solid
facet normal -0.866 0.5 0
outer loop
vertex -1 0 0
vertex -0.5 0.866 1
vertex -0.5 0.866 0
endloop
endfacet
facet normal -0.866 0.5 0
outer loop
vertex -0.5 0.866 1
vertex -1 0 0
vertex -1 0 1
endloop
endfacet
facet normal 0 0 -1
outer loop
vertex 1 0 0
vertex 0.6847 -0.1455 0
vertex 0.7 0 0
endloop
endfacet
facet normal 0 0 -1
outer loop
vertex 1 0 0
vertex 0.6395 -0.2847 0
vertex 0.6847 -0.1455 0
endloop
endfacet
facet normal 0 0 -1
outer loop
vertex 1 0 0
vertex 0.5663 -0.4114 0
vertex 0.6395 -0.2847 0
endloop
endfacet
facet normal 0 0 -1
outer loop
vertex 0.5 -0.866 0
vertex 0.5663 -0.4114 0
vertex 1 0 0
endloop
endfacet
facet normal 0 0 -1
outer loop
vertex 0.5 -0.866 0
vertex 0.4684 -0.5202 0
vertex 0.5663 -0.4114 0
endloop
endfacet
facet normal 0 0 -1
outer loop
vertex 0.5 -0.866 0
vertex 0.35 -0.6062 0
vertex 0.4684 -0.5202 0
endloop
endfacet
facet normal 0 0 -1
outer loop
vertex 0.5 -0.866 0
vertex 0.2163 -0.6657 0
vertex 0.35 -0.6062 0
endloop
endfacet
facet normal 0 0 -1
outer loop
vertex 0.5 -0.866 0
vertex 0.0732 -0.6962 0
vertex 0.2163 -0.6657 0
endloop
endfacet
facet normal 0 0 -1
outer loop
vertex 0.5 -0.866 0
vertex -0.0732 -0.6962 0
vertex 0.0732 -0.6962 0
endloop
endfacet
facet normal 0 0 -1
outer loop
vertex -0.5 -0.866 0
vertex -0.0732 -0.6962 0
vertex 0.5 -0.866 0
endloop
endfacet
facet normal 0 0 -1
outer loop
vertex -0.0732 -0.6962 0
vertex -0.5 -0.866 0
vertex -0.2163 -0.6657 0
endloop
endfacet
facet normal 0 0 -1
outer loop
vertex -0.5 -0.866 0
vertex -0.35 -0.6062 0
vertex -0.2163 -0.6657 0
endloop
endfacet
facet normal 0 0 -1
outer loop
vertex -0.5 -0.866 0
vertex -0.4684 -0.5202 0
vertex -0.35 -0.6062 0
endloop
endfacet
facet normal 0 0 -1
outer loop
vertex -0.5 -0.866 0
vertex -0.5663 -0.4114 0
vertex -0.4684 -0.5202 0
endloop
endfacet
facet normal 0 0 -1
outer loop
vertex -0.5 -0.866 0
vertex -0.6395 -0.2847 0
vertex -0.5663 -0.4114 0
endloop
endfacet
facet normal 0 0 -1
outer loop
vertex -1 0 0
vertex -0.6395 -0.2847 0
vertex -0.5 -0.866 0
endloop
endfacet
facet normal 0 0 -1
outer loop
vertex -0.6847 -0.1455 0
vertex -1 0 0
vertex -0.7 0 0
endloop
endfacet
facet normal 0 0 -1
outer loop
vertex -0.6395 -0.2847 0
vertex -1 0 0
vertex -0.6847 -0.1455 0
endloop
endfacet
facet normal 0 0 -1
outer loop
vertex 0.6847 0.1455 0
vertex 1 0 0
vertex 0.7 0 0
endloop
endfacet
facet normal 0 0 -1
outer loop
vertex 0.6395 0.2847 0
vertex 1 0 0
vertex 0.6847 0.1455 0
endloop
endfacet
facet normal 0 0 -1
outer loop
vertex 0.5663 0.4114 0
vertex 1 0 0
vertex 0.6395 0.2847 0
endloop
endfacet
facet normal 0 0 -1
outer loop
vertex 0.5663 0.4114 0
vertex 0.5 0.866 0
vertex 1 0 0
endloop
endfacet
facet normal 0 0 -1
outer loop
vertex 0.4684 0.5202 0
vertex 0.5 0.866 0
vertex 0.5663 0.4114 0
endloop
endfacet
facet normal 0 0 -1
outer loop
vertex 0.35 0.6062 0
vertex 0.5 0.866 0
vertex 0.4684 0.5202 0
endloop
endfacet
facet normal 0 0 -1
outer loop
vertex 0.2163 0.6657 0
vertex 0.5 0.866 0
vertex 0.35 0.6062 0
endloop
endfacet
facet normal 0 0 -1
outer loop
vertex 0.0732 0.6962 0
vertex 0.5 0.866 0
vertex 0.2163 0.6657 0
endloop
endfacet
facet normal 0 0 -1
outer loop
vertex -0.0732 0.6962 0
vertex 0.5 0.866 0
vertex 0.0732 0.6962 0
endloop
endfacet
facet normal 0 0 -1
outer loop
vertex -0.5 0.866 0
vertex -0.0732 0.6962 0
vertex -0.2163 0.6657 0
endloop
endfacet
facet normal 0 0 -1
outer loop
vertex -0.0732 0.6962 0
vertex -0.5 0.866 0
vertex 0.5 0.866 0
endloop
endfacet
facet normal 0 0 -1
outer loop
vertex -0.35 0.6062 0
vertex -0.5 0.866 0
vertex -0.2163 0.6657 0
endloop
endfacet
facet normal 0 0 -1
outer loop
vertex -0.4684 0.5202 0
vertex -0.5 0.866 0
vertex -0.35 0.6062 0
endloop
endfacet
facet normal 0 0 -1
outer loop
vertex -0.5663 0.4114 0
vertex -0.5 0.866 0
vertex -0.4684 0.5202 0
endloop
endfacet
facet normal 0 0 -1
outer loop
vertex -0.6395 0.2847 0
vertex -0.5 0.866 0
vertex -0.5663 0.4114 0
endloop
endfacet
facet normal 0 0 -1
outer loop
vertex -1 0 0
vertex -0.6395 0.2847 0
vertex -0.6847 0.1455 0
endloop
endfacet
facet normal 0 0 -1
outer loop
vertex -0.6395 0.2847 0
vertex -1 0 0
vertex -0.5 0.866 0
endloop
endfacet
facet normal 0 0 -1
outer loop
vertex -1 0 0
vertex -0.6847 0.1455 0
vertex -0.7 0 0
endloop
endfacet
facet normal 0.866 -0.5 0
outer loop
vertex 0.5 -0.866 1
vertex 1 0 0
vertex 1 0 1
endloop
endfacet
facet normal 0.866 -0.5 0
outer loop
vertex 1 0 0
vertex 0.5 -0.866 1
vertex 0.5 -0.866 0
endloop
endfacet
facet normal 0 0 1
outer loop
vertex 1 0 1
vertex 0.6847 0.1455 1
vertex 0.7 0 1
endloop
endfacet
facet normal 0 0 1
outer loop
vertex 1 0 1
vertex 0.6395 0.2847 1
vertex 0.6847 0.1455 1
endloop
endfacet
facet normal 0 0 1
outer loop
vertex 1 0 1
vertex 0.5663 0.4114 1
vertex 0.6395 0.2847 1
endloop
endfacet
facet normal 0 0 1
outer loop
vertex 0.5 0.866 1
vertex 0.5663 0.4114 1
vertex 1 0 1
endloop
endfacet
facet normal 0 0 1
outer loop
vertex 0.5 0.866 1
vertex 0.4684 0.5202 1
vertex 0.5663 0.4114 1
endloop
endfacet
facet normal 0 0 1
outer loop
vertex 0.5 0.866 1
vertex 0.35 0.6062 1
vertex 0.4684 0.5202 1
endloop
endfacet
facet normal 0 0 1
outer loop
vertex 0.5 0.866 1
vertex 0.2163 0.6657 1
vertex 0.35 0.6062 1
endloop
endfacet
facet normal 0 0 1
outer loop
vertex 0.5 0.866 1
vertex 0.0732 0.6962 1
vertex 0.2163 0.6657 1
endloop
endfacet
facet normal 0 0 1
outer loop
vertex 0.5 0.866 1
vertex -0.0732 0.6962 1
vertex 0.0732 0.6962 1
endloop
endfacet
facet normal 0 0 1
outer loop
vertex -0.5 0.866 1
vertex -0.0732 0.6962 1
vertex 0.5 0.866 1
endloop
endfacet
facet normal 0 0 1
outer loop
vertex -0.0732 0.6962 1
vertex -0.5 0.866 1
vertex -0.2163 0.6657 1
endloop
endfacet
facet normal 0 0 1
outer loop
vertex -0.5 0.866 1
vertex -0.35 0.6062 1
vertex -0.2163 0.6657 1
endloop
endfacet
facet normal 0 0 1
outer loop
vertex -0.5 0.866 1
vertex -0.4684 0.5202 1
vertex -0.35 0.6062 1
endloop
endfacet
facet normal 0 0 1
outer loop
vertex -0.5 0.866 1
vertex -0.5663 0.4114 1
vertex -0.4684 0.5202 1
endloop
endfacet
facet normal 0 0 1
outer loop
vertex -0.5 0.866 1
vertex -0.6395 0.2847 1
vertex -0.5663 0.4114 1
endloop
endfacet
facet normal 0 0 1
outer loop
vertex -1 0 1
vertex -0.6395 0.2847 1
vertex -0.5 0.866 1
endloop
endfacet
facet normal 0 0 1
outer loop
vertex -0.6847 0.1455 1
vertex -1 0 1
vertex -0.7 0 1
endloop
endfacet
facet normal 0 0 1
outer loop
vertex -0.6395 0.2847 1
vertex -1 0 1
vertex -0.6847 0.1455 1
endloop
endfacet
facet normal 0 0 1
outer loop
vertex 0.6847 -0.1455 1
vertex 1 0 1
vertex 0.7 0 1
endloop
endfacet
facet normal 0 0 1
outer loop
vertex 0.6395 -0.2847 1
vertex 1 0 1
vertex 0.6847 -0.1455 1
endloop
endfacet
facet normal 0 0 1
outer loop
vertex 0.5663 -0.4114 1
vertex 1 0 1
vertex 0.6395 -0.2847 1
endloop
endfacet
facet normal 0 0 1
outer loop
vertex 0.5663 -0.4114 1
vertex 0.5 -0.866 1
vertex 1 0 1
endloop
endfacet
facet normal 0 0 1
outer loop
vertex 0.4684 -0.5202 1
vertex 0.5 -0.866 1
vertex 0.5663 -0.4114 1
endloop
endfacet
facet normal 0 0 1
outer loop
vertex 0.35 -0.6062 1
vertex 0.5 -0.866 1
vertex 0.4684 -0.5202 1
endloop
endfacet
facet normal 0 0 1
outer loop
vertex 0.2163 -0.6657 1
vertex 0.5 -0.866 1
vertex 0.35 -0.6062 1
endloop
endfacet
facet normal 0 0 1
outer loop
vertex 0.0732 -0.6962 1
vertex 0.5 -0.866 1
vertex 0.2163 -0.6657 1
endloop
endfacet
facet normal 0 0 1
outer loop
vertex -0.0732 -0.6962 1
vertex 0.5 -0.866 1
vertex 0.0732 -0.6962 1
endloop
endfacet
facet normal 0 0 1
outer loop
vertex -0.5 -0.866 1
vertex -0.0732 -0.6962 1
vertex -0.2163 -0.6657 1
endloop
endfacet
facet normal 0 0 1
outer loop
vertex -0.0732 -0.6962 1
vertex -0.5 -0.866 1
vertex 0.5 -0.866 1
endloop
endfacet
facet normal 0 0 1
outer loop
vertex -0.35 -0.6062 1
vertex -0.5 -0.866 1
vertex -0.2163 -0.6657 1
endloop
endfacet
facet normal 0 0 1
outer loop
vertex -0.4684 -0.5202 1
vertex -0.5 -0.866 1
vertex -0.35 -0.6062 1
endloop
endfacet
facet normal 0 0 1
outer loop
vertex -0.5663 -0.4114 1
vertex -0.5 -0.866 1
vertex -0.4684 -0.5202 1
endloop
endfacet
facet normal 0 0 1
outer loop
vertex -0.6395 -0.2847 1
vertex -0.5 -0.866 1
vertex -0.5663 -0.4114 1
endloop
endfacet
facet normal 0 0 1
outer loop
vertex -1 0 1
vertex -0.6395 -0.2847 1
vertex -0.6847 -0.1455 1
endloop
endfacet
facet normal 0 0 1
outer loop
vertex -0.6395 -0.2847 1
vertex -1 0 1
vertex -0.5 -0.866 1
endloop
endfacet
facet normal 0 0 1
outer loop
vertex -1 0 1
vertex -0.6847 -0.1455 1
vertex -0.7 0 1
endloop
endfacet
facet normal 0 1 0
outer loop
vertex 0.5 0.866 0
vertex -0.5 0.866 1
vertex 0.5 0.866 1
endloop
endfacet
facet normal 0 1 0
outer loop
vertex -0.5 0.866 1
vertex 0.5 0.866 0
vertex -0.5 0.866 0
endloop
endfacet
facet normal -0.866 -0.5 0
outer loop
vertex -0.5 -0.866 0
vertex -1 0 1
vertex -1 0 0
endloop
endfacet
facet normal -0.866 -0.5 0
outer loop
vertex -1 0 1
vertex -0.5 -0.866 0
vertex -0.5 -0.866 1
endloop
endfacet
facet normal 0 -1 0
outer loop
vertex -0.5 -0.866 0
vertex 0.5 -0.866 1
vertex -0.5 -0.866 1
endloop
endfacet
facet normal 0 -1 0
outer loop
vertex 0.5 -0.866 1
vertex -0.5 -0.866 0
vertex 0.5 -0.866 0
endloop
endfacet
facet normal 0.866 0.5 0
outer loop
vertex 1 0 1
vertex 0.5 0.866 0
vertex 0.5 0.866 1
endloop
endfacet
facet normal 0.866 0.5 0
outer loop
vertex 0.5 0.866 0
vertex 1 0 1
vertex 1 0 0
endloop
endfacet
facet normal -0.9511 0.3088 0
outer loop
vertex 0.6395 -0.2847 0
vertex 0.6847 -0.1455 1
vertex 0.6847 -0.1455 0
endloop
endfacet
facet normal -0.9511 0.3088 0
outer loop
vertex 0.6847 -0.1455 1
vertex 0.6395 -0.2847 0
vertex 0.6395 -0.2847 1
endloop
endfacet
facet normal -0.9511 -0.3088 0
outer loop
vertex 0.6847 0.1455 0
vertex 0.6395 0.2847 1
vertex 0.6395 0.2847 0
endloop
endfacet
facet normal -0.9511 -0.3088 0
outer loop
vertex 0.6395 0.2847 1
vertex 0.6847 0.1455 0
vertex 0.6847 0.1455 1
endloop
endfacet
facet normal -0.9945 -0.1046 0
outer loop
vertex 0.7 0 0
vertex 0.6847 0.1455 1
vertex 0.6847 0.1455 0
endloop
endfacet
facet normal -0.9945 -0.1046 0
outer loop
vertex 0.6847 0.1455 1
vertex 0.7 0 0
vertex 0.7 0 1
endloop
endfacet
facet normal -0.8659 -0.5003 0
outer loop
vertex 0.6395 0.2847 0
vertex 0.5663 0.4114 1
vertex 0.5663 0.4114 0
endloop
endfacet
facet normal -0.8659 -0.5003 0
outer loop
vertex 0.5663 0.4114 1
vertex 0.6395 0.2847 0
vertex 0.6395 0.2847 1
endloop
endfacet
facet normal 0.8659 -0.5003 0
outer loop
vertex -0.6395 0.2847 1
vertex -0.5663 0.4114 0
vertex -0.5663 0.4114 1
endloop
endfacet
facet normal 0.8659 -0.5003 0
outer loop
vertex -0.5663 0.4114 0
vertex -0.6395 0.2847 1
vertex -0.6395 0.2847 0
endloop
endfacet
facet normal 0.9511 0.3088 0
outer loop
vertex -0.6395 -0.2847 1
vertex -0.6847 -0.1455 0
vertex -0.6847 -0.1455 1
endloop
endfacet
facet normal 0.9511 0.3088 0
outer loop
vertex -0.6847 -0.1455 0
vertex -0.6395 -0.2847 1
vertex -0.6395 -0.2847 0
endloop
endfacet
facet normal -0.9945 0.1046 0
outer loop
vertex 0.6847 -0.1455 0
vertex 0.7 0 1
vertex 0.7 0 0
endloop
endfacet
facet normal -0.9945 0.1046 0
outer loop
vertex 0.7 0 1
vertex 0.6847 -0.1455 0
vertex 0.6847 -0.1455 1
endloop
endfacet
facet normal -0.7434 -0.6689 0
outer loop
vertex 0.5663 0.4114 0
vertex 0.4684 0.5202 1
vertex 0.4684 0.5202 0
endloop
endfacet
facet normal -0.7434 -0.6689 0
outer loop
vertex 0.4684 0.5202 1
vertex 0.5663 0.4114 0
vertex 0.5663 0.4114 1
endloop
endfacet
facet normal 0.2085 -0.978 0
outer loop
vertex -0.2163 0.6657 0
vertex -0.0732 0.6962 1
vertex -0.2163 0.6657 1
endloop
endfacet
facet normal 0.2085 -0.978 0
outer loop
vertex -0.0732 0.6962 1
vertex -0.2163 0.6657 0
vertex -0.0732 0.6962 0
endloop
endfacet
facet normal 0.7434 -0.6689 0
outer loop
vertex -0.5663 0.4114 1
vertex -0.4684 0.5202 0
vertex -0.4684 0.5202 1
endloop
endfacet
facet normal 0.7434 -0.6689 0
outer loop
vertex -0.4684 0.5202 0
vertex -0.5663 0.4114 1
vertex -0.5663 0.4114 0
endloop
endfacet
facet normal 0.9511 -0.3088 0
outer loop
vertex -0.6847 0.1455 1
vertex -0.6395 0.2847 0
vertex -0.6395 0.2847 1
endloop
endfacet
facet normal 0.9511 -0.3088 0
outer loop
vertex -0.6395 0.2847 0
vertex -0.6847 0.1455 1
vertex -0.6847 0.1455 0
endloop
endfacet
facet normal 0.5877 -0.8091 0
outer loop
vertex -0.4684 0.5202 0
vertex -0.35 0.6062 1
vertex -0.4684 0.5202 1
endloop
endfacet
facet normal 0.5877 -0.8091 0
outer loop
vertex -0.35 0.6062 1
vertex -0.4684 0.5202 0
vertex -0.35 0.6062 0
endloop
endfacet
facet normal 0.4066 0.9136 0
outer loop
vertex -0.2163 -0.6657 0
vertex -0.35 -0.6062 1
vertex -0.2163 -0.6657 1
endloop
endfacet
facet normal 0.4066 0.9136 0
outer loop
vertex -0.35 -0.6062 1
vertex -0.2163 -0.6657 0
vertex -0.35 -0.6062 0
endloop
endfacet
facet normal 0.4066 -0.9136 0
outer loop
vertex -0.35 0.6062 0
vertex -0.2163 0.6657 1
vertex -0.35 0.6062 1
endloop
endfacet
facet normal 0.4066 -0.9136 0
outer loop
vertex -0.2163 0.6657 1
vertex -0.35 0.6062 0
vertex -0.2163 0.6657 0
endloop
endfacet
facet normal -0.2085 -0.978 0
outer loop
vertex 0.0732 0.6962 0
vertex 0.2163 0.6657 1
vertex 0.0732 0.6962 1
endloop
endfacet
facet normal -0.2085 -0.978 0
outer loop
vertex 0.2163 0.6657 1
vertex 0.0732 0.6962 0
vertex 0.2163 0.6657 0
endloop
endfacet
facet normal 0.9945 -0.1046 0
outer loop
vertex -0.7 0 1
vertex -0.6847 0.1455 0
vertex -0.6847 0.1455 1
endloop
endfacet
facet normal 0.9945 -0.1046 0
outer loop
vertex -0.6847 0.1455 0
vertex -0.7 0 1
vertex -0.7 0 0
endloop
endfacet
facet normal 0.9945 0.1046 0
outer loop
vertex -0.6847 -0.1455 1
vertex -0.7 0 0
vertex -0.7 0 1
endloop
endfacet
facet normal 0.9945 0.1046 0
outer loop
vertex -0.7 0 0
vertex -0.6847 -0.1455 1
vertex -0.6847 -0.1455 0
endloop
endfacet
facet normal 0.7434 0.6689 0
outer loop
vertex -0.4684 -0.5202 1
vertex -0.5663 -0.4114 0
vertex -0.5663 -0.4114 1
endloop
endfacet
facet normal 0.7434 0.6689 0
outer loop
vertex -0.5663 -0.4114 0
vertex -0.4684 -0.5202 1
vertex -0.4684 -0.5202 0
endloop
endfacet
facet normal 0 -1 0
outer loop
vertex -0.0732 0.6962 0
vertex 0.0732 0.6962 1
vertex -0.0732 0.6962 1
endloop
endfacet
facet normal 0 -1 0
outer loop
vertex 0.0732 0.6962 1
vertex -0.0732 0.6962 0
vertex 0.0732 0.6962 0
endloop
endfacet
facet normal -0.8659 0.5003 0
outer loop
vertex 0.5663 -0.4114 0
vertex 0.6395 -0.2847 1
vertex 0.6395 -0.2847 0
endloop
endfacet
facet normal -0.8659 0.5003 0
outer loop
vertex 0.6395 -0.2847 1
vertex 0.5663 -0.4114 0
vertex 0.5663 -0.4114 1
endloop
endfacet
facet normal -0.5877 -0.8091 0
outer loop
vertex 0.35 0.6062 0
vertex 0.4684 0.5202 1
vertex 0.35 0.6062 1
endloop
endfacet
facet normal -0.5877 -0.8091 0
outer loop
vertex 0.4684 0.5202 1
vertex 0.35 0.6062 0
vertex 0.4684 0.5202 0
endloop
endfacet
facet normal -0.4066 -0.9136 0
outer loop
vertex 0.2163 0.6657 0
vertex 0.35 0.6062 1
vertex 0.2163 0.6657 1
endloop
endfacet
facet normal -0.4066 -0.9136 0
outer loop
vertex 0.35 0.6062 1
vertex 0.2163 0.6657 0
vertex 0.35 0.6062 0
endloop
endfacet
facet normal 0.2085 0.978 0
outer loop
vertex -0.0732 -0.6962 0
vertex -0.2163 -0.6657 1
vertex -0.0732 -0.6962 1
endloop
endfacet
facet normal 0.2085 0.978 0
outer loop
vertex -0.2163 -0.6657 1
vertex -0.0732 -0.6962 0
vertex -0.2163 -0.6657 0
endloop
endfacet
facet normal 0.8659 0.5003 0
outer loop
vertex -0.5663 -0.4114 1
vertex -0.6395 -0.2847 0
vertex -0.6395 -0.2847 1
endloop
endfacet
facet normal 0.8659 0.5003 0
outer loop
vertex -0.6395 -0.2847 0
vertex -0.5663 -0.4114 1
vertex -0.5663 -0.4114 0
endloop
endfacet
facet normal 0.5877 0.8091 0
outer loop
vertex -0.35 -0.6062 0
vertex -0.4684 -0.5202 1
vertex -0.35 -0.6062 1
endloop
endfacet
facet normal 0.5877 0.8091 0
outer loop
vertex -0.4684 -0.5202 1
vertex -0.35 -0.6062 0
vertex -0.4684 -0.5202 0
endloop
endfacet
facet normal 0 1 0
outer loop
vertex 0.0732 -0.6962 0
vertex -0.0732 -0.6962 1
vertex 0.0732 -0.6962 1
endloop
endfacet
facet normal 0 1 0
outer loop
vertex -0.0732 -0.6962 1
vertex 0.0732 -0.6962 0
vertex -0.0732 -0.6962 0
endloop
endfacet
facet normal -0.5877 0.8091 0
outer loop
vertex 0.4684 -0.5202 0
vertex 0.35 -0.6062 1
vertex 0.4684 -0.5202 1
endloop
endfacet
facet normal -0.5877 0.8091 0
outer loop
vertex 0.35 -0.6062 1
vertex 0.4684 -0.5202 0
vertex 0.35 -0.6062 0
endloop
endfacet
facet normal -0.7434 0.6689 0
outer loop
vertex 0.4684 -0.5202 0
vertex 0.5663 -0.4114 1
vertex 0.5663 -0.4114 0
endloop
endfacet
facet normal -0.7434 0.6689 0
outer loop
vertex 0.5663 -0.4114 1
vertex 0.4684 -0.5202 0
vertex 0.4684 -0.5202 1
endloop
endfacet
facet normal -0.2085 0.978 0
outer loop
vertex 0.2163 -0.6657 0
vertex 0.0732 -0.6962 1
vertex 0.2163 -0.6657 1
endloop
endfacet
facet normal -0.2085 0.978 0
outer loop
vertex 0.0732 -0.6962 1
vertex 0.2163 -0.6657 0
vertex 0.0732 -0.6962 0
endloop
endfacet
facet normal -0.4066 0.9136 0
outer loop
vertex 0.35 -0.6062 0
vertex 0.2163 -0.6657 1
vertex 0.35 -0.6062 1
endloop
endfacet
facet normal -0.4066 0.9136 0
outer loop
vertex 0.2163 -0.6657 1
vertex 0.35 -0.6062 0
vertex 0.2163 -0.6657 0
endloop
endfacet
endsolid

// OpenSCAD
module Nut_LQ(){

    module regular_polygon(order = 6, r=1){
         angles=[ for (i = [0:order-1]) i*(360/order) ];
         coords=[ for (th=angles) [r*cos(th), r*sin(th)] ];
         polygon(coords);
     }
         
    color("#a8b0b2"){
 
        difference(){
        linear_extrude(height =1){
             regular_polygon(order = 6);
             }
             cylinder(2.1,0.7,0.7,center = true, $fn=30);
             }
    }
}

Nut_LQ();


// Written by Nicolì Angelo (Gengio) 2024: 
// MIT License

//Permission is hereby granted, free of charge, to any person obtaining a copy of this software and associated documentation files (the "Software"), to deal in the Software without restriction, including without limitation the rights to use, copy, modify, merge, publish, distribute, sublicense, and/or sell copies of the Software, and to permit persons to whom the Software is furnished to do so, subject to the following conditions:

//The above copyright notice and this permission notice shall be included in all copies or substantial portions of the Software.

//THE SOFTWARE IS PROVIDED "AS IS", WITHOUT WARRANTY OF ANY KIND, EXPRESS OR IMPLIED, INCLUDING BUT NOT LIMITED TO THE WARRANTIES OF MERCHANTABILITY, FITNESS FOR A PARTICULAR PURPOSE AND NONINFRINGEMENT. IN NO EVENT SHALL THE AUTHORS OR COPYRIGHT HOLDERS BE LIABLE FOR ANY CLAIM, DAMAGES OR OTHER LIABILITY, WHETHER IN AN ACTION OF CONTRACT, TORT OR OTHERWISE, ARISING FROM, OUT OF OR IN CONNECTION WITH THE SOFTWARE OR THE USE OR OTHER DEALINGS IN THE SOFTWARE.
